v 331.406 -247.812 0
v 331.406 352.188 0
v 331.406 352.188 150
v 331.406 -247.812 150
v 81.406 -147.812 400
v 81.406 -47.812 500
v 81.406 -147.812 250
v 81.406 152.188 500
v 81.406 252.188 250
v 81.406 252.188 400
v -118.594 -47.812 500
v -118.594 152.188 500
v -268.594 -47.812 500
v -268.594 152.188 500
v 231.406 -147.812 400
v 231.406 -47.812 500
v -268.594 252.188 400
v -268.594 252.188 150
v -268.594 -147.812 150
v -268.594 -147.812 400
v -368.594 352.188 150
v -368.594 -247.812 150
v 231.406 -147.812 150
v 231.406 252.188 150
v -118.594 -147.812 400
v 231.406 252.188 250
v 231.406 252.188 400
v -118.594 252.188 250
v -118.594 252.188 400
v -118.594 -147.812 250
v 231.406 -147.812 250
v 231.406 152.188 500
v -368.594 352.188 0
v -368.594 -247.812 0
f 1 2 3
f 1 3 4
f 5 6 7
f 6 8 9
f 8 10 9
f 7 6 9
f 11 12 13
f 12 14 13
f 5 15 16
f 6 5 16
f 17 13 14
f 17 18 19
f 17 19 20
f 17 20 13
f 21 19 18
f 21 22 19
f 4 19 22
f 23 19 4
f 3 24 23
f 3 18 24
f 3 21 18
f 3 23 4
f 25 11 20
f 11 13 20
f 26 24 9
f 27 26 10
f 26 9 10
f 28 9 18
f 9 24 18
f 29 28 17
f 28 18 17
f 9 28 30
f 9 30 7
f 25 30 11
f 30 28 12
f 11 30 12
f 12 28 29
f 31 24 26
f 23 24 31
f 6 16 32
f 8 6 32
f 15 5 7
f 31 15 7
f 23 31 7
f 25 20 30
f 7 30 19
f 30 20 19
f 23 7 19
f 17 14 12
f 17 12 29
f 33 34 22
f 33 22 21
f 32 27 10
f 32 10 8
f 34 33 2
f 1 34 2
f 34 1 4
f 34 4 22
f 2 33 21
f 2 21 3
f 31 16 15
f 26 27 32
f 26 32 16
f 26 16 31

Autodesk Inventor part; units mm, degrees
ref_plane "YZ Plane" through (0, 0, 0) normal (1, 0, 0) x (0, 1, 0)
sketch "Sketch1" plane through (0, 0, 0) normal (0, 0, 1) x (1, 0, 0)
  line L0 (-368.5938, -273.4375) -> (-368.5938, 352.1875)
  line L1 (-368.5938, 352.1875) -> (331.4062, 352.1875)
  line L2 (331.4062, 352.1875) -> (331.4062, -247.8125)
  line L3 (331.4062, -247.8125) -> (-368.5938, -247.8125)
  line L4 (-368.5938, -247.8125) -> (-368.5938, -273.4375)
  point P0 (0, 0)
  dimension "d0" = 700
  dimension "d1" = 600
extrude "Extrusion1" add sketch "Sketch1" along normal blind 150
ref_plane "Work Plane1" through (0, 0, 150) normal (0, 0, 1) x (1, 0, 0)
sketch "Sketch2" plane through (0, 0, 150) normal (0, 0, 1) x (1, 0, 0)
  line L0 (-268.5938, -147.8125) -> (-268.5938, 252.1875)
  line L1 (-268.5938, 252.1875) -> (231.4062, 252.1875)
  line L2 (231.4062, 252.1875) -> (231.4063, -147.8125)
  line L3 (231.4063, -147.8125) -> (-268.5938, -147.8125)
  line L4 (331.4062, 352.1875) -> (-368.5938, 352.1875) projected
  line L5 (331.4062, -247.8125) -> (331.4062, 352.1875) projected
  point P0 (0, 0)
  dimension "d5" = 500
  dimension "d6" = 400
  dimension "d7" = 100
  dimension "d8" = 100
extrude "Extrusion2" add sketch "Sketch2" along normal blind 100
sketch "Sketch3" plane through (231.4062, -147.8125, 150) normal (1, 0, 0) x (0, 0, -1)
  line L0 (-100, 0) -> (-100, 400) projected
  line L1 (-100, 0) -> (-250, 0)
  line L2 (-350, 100) -> (-350, 300)
  line L3 (-250, 400) -> (-100, 400)
  line L4 (0, 400) -> (-100, 400) projected
  line L5 (-250, 400) -> (-350, 300)
  line L6 (-250, 0) -> (-350, 100)
  point P0 (150, 147.8125)
  point P1 (-350, 0)
  point P2 (-350, 400)
  dimension "d11" = 250
  dimension "d12" = 400
  dimension "d13" = 100
  dimension "d14" = 45
  dimension "d15" = 100
  dimension "d16" = 45
extrude "Extrusion3" add sketch "Sketch3" against normal blind 150
ref_plane "Work Plane2" through (-18.5938, -147.8125, 150) normal (1, 0, 0) x (0, 0, -1)
mirror "Mirror1" about plane through (-18.5938, -147.8125, 150) normal (1, 0, 0) of "Extrusion3"
equation "\"d15\" = d13"
equation "\"d16\" = d14"
properties part number "BT020_Doppelführung"
